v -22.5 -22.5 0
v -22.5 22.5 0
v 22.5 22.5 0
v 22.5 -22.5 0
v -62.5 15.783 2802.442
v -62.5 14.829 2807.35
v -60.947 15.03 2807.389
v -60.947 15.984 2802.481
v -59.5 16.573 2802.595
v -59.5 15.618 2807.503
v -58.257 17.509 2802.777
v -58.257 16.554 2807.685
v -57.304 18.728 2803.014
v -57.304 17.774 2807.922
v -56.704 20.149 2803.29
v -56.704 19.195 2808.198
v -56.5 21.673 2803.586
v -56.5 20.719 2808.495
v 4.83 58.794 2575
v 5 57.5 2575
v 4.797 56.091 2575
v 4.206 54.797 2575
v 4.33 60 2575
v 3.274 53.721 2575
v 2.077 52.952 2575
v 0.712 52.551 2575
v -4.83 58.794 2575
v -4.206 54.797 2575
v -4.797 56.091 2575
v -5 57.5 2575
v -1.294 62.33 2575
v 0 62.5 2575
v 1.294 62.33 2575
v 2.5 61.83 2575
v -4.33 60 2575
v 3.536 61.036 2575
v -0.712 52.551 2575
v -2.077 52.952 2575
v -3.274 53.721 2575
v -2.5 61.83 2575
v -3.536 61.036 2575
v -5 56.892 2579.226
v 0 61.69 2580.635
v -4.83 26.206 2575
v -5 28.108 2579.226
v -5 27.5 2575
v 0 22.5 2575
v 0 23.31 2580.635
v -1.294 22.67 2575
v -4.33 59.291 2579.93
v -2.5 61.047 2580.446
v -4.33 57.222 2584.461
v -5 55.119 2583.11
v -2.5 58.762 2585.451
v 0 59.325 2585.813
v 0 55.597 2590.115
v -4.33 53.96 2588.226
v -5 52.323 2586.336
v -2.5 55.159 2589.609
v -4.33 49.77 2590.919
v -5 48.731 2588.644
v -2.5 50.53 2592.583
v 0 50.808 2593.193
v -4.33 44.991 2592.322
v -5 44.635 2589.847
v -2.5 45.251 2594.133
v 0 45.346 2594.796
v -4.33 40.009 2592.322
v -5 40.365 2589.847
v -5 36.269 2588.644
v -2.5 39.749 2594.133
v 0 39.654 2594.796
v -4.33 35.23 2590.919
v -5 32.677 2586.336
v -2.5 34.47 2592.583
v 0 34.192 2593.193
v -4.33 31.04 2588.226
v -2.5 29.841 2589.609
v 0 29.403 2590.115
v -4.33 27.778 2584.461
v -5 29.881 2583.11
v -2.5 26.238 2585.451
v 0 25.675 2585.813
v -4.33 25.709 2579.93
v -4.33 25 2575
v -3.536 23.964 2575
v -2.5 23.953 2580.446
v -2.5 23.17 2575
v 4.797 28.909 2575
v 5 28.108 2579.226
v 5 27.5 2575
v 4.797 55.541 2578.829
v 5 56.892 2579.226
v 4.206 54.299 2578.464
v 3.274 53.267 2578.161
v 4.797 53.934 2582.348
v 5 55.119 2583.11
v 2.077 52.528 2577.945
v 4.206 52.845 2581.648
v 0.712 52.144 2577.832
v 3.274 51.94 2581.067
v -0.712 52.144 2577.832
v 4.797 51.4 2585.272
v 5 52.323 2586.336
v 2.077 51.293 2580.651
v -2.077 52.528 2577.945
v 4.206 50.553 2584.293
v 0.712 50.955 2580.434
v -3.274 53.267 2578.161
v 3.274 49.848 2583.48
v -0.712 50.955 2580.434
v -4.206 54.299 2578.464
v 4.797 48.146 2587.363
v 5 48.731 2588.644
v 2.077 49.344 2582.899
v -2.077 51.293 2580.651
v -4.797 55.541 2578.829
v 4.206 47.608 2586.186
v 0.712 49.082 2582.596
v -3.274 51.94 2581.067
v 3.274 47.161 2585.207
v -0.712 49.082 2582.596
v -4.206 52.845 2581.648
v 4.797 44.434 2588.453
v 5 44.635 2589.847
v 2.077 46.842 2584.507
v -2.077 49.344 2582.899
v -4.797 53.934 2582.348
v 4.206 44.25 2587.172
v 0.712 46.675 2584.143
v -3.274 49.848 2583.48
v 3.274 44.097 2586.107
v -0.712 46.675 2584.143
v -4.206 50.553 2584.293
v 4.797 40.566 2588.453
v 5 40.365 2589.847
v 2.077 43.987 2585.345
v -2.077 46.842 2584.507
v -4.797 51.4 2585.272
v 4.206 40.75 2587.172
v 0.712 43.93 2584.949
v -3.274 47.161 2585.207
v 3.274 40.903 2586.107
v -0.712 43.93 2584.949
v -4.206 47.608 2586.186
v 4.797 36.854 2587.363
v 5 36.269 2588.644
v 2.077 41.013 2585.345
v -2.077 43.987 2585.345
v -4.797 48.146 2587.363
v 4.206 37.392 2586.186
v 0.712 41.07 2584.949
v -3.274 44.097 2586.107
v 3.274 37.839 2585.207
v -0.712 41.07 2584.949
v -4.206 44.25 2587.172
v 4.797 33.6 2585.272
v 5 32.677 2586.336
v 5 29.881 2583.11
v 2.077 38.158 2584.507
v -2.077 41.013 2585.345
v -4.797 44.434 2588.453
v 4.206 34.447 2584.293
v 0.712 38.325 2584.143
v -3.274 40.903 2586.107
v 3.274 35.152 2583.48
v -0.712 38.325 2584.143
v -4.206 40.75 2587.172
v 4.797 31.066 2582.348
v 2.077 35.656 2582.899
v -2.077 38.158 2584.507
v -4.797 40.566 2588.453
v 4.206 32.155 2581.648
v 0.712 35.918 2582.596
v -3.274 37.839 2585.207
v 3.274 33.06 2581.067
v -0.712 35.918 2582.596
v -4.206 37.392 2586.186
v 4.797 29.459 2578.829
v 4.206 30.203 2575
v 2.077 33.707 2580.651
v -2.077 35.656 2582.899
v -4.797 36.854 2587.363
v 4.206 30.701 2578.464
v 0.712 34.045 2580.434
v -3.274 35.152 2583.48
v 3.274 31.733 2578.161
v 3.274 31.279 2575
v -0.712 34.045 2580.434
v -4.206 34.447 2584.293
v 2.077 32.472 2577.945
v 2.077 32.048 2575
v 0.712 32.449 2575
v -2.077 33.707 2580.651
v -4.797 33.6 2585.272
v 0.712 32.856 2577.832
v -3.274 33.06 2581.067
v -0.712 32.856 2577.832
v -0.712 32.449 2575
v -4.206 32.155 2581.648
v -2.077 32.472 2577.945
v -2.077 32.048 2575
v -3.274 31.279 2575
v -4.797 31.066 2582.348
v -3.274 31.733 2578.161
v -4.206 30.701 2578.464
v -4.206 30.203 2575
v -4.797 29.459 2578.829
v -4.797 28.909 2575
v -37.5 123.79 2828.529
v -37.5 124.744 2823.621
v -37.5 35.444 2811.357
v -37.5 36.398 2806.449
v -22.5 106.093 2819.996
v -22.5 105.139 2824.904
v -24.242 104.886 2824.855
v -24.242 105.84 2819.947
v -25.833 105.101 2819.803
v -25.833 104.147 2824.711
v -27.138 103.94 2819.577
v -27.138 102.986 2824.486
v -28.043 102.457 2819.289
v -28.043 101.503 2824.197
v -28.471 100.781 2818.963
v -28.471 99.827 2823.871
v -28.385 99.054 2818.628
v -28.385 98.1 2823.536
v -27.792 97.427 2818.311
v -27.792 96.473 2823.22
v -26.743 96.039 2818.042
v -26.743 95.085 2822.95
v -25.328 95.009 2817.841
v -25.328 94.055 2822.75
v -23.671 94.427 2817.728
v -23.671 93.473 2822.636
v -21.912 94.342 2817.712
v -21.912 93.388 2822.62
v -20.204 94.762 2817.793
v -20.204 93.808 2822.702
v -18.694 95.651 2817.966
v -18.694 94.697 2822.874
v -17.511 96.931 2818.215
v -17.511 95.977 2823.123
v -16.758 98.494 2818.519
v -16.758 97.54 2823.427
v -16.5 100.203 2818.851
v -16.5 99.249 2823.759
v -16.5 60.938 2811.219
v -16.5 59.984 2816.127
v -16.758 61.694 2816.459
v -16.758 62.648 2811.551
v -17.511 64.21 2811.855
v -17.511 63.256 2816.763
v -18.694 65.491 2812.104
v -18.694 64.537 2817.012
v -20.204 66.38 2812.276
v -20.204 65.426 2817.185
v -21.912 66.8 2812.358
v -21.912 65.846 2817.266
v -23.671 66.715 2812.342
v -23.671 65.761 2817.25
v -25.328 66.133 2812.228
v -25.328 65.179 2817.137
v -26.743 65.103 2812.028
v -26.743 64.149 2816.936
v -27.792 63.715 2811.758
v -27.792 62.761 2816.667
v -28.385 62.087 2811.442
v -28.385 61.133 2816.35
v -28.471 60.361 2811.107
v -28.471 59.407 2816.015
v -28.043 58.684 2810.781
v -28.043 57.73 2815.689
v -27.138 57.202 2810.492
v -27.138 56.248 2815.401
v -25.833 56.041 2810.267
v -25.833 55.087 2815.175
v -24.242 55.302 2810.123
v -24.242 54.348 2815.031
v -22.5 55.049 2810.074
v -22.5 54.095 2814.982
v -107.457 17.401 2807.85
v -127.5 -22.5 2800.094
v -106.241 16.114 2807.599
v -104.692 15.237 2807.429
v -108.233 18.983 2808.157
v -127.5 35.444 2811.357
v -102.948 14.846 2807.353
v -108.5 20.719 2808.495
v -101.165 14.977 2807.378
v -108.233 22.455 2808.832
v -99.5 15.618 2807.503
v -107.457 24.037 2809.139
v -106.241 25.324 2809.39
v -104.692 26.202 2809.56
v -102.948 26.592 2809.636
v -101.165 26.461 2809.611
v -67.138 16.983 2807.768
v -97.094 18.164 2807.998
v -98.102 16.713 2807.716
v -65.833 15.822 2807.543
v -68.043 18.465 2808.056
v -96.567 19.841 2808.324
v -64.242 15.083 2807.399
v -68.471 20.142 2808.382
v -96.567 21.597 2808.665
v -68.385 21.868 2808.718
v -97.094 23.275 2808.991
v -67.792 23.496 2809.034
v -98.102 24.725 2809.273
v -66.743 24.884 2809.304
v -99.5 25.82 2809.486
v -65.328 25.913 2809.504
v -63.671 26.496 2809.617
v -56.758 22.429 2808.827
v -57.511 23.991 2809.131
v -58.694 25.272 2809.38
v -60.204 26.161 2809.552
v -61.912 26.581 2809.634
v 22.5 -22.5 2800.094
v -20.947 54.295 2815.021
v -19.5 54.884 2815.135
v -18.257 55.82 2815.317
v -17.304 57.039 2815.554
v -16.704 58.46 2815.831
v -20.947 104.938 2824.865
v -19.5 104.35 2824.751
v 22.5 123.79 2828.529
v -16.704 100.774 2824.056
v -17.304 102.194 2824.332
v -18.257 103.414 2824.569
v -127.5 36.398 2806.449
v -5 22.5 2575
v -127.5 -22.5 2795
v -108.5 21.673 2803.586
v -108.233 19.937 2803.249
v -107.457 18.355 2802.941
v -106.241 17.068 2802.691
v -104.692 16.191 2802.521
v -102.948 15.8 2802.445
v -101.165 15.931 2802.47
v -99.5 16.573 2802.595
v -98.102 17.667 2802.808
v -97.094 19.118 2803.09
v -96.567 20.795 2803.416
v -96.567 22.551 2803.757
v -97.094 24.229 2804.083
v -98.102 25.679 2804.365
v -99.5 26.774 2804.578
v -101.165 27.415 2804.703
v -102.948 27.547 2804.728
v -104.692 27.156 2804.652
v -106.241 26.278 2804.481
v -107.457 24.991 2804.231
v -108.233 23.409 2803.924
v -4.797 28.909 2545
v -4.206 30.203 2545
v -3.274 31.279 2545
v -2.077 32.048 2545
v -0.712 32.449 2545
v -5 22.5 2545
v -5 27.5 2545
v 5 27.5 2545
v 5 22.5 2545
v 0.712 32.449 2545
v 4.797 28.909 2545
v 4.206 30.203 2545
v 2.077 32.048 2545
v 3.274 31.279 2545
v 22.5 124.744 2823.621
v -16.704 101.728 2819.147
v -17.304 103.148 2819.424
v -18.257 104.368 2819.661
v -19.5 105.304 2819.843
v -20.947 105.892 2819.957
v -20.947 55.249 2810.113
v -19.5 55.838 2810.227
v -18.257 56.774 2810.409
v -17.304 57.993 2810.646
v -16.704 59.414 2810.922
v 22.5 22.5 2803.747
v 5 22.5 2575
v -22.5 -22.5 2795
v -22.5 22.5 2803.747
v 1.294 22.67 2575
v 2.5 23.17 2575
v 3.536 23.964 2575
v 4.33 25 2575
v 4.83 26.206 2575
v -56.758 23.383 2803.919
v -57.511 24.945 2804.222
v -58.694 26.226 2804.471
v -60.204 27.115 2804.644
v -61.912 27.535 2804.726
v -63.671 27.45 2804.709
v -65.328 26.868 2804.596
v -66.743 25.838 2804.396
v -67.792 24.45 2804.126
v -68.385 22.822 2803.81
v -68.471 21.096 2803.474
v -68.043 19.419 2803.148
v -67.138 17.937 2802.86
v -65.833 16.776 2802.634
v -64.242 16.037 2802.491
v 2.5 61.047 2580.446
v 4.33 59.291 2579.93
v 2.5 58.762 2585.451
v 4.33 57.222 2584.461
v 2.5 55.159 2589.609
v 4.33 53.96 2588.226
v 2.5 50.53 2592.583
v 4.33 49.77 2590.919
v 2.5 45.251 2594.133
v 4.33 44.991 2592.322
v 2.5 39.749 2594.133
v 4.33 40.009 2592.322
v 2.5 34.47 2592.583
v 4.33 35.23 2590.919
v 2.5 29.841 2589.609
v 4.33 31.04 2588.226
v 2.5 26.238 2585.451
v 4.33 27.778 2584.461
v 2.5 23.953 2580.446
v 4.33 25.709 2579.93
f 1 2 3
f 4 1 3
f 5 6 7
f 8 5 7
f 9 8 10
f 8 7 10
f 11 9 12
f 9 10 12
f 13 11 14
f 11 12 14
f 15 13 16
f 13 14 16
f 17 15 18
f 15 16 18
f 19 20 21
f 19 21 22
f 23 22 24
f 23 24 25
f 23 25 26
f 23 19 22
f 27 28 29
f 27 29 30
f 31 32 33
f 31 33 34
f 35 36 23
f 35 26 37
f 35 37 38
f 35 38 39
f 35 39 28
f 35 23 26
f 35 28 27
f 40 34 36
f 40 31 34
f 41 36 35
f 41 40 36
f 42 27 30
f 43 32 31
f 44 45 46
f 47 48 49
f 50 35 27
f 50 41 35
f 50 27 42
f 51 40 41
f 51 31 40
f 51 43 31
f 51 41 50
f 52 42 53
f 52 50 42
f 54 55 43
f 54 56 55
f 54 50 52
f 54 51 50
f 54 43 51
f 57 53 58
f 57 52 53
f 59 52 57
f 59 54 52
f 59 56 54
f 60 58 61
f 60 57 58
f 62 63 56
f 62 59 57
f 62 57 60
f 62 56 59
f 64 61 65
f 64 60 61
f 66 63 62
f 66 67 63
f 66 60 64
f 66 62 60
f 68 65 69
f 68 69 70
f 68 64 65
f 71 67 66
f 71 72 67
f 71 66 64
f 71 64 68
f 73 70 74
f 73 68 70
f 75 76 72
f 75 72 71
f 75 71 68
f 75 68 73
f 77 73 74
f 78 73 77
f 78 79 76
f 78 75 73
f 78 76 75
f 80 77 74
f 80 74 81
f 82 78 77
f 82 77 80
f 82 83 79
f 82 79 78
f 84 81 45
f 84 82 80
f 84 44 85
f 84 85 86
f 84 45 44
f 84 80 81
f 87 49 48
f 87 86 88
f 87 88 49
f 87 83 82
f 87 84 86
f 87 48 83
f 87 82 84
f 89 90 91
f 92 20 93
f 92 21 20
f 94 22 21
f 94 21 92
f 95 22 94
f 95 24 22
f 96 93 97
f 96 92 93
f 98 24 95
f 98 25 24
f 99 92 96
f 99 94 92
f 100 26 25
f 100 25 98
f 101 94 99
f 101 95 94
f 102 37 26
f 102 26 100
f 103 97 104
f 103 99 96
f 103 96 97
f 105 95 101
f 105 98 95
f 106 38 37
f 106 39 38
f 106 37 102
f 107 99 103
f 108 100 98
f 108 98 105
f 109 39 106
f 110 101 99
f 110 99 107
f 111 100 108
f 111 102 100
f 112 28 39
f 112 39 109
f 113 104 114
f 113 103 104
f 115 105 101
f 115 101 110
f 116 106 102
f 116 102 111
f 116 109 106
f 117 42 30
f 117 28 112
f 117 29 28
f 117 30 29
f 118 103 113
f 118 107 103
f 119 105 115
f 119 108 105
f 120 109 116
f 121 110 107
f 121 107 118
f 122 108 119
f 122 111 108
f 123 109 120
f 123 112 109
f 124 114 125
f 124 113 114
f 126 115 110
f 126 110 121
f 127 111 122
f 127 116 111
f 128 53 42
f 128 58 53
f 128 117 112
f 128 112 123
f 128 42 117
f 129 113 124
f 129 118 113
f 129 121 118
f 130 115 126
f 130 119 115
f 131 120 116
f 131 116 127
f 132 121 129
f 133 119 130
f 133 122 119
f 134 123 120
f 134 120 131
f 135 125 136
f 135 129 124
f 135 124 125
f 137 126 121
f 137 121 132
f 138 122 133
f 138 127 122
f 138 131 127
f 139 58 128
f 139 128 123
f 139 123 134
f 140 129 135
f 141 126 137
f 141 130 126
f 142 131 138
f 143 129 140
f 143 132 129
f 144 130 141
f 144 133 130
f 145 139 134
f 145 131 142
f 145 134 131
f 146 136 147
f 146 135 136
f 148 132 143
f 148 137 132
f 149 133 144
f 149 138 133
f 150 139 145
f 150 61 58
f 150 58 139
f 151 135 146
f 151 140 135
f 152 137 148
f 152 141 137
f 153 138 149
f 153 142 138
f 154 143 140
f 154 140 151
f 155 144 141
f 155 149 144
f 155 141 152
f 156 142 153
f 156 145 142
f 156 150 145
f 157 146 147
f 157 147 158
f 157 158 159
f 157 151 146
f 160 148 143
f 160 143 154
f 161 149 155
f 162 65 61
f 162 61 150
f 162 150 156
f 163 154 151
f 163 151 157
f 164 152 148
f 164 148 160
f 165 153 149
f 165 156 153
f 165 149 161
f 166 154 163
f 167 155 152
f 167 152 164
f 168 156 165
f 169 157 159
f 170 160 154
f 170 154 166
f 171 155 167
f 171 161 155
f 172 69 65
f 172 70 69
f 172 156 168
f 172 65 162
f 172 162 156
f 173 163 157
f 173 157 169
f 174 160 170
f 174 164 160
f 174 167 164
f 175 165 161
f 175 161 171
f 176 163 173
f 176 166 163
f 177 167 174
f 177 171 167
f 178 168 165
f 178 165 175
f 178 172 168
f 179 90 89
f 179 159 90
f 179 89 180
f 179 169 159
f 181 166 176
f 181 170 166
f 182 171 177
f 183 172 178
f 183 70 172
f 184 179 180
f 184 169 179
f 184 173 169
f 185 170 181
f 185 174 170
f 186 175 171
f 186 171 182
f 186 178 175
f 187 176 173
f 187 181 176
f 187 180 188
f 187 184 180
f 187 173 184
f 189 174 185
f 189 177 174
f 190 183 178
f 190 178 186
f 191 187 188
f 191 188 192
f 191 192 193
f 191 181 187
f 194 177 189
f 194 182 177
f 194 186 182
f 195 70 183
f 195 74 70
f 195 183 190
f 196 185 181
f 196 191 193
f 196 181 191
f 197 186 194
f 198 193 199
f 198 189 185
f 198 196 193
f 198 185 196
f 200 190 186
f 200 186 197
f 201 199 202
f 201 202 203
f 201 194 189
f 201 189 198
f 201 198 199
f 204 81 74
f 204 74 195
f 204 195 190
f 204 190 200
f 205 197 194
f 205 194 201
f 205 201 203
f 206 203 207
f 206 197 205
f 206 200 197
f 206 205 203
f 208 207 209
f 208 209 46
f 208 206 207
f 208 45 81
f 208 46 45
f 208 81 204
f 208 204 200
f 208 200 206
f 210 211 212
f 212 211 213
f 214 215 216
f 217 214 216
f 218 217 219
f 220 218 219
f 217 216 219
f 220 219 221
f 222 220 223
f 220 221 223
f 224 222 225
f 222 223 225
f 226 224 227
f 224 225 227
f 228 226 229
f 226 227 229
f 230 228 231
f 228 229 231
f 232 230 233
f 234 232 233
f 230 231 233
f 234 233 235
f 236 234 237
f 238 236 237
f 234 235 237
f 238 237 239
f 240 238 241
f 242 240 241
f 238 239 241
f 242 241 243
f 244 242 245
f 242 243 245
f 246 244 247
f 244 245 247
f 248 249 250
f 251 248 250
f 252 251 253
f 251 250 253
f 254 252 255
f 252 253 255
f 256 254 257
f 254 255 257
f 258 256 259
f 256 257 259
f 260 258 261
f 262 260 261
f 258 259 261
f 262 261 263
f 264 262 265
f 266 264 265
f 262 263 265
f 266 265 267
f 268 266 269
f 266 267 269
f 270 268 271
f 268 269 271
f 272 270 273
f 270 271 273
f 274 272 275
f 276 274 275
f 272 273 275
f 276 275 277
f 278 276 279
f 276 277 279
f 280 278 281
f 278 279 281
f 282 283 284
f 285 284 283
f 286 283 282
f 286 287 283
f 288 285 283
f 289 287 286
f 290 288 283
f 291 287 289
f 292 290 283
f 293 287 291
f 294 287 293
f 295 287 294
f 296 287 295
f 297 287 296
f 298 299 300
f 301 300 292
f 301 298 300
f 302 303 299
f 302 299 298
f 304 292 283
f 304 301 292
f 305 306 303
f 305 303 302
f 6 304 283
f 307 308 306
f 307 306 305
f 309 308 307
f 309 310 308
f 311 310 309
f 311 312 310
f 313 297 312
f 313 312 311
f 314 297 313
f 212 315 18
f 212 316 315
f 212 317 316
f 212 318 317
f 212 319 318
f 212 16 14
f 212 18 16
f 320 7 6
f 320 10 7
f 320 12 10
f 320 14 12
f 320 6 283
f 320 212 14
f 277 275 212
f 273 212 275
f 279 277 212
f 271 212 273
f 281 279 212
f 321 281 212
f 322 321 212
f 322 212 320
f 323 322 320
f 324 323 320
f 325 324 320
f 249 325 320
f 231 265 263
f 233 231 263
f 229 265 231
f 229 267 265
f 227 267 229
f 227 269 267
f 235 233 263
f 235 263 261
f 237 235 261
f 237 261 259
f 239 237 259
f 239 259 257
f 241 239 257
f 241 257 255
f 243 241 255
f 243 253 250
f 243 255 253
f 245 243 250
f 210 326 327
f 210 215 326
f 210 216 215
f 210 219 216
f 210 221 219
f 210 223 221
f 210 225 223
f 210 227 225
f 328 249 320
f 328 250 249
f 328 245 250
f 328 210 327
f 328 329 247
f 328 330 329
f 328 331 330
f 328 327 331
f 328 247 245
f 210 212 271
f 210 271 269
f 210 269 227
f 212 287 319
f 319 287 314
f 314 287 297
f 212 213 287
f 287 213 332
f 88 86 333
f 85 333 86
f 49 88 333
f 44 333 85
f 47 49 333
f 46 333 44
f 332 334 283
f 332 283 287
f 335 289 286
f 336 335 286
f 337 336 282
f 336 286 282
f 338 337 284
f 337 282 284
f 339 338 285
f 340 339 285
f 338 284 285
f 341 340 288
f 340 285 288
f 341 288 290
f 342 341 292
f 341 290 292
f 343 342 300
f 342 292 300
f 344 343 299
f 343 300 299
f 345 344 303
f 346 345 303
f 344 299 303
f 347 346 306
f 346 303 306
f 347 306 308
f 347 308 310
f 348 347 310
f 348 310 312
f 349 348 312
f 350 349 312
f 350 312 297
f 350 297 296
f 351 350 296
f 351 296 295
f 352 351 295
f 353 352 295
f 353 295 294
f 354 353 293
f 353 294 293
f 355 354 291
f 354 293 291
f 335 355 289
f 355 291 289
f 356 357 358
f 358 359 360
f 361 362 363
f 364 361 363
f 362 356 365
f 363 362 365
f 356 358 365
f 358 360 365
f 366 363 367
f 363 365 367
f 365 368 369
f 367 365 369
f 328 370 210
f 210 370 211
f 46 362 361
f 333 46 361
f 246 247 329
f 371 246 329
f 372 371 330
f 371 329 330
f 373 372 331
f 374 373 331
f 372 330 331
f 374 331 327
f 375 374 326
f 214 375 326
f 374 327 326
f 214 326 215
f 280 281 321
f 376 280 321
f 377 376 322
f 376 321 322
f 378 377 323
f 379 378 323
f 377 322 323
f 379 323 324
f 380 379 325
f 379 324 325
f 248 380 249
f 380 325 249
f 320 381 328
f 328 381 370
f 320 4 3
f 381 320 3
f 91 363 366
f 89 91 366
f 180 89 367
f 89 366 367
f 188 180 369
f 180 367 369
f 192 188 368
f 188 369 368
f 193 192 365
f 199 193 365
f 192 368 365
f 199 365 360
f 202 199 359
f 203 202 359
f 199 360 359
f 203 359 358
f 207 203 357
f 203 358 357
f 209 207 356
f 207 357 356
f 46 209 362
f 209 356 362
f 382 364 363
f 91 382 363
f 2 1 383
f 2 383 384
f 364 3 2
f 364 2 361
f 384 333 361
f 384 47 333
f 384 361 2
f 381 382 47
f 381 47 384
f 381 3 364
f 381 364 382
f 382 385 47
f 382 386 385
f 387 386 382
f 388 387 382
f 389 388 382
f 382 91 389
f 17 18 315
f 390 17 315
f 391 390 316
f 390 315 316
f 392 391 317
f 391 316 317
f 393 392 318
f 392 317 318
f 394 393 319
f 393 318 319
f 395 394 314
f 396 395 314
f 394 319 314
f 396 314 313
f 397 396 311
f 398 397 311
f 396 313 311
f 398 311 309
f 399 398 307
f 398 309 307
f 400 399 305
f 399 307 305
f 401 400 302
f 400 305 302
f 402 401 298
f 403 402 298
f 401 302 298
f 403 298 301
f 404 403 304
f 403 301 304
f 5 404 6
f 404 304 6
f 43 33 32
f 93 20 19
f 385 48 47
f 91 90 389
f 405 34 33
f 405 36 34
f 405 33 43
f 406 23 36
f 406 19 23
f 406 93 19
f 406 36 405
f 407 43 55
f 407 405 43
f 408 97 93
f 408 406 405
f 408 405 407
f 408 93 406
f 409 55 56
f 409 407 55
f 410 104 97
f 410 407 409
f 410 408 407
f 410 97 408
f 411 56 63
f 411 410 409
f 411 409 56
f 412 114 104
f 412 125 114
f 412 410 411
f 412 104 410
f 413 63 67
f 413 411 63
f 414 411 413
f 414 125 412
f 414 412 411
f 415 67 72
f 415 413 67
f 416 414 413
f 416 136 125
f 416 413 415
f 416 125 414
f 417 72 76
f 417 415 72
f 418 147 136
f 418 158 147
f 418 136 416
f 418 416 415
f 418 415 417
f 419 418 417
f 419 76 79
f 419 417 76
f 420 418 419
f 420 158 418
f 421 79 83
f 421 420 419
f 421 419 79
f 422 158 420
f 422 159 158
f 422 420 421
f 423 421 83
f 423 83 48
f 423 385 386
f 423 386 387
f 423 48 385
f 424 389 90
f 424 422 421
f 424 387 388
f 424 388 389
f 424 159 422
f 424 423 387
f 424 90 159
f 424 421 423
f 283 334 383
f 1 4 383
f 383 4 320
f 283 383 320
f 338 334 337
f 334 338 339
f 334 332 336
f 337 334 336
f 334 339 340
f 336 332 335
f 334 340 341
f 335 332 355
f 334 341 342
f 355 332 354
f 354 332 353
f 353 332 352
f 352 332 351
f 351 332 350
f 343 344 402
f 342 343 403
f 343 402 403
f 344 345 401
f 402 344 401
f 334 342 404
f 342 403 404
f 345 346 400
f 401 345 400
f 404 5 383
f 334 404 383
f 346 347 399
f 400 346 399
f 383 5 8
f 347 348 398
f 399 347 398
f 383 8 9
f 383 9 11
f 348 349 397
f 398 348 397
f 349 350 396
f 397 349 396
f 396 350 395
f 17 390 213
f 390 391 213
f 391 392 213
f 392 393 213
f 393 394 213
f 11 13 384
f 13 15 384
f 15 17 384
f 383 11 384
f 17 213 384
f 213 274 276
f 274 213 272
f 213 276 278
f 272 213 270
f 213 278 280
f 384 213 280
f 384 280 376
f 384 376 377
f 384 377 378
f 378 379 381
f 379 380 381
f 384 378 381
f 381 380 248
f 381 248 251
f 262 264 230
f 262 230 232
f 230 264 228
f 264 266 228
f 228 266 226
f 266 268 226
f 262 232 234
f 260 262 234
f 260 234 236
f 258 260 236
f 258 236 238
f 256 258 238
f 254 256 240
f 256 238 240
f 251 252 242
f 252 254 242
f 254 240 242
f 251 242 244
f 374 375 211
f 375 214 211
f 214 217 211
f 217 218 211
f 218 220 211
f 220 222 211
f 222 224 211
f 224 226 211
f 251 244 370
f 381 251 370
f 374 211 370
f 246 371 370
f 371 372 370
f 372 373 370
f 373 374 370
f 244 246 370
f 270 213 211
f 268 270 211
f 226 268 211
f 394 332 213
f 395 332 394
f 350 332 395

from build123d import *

# Parameters (mm, degrees)
F0_W          = 45
F0_H          = 45
F1_DEPTH      = 2795
F3_W          = 45
F3_H          = 60
F3_W_2        = 90
F3_W_3        = 15
F4_DEPTH      = 5
F6_DEPTH      = 45
F8_W          = 2.7798460424
F8_H          = 5.7082939148
F9_DEPTH      = 156.8
F9_DEPTH_BACK = 105
F14_DEPTH     = 5
F15_DEPTH     = 30


with BuildPart() as f1:
    # F0 (on Top) → F1 (new body)
    with BuildSketch(Plane.XY):
        Rectangle(F0_W, F0_H)
    extrude(amount=F1_DEPTH)


with BuildPart() as f4:
    # F3 (on face) → F4 (new body)
    with BuildSketch(Plane(origin=(0, -524.3318959349, 2697.453760933), x_dir=(1, 0, 0), z_dir=(0, -0.1908089954, 0.9816271834))):
        with Locations((-15, 541.2245304499)):
            Rectangle(F3_W, F3_H)
        with Locations((-82.5, 541.2245304499)):
            Rectangle(F3_W_2, F3_H)
        with Locations((15, 541.2245304499)):
            Rectangle(F3_W_3, F3_H)
        Polygon((-37.5, 661.2245304499), (-37.5, 571.2245304499), (7.5, 571.2245304499), (22.5, 571.2245304499), (22.5, 661.2245304499), align=None)
    extrude(amount=F4_DEPTH)


with BuildPart() as f6:
    # F5 (on face) → F6 (new body)
    with BuildSketch(Plane.YZ.offset(22.5)):
        Polygon((-22.5, 2795), (22.5, 2795), (22.5, 2803.7471139112), align=None)
    extrude(amount=-F6_DEPTH)


with BuildPart() as f1_1:
    add(f1.part)

    # F7: union F6, F4
    add(f6.part)
    add(f4.part)

    # F8 (on face) → F9 (cut, two sides)
    with BuildSketch(Plane(origin=(-22.5, 0, 0), x_dir=(0, -1, 0), z_dir=(-1, 0, 0))) as f9_sk:
        with Locations((23.8899230212, 2797.8541469574)):
            Rectangle(F8_W, F8_H)
    extrude(amount=-F9_DEPTH, mode=Mode.SUBTRACT)
    extrude(f9_sk.sketch, amount=F9_DEPTH_BACK, mode=Mode.SUBTRACT)

    # F13 (on face) → F14 (cut, through all)
    with BuildSketch(Plane(origin=(0, -525.2859409117, 2702.3618968503), x_dir=(1, 0, 0), z_dir=(0, -0.1908089954, 0.9816271834))):
        with BuildLine():
            ThreePointArc((-56.5, 556.2245304499), (-66.7426406871, 560.467171137), (-62.5, 550.2245304499))
            ThreePointArc((-62.5, 550.2245304499), (-58.2573593129, 551.9818897628), (-56.5, 556.2245304499))
        make_face()
        with BuildLine():
            ThreePointArc((-96.5, 556.2245304499), (-102.5, 562.2245304499), (-108.5, 556.2245304499))
            ThreePointArc((-108.5, 556.2245304499), (-102.5, 550.2245304499), (-96.5, 556.2245304499))
        make_face()
        with BuildLine():
            ThreePointArc((-16.5, 596.2245304499), (-26.7426406871, 600.467171137), (-22.5, 590.2245304499))
            ThreePointArc((-22.5, 590.2245304499), (-18.2573593129, 591.9818897628), (-16.5, 596.2245304499))
        make_face()
        with BuildLine():
            ThreePointArc((-16.5, 636.2245304499), (-18.2573593129, 640.467171137), (-22.5, 642.2245304499))
            ThreePointArc((-22.5, 642.2245304499), (-26.7426406871, 631.9818897628), (-16.5, 636.2245304499))
        make_face()
    extrude(amount=-F14_DEPTH, mode=Mode.SUBTRACT)

    # F12 (on offset) → F15 (join)
    with BuildSketch(Plane.XY.offset(2545)):
        with BuildLine():
            Line((0, 27.5), (5, 27.5))
            ThreePointArc((5, 27.5), (0, 32.5), (-5, 27.5))
            Line((-5, 27.5), (0, 27.5))
        make_face()
        with BuildLine():
            Line((5, 22.5), (5, 27.5))
            ThreePointArc((5, 27.5), (3.5355339059, 23.9644660941), (0, 22.5))
            Line((0, 22.5), (5, 22.5))
        make_face()
        with BuildLine():
            ThreePointArc((0, 22.5), (3.5355339059, 23.9644660941), (5, 27.5))
            Line((5, 27.5), (0, 27.5))
            Line((0, 27.5), (0, 22.5))
        make_face()
        with BuildLine():
            Line((0, 27.5), (-5, 27.5))
            ThreePointArc((-5, 27.5), (-3.5355339059, 23.9644660941), (0, 22.5))
            Line((0, 22.5), (0, 27.5))
        make_face()
        with BuildLine():
            ThreePointArc((0, 22.5), (-3.5355339059, 23.9644660941), (-5, 27.5))
            Line((-5, 27.5), (-5, 22.5))
            Line((-5, 22.5), (0, 22.5))
        make_face()
    extrude(amount=F15_DEPTH)

    # F17: sweep along a path in F11
    with BuildLine(Plane.YZ) as f17_path:
        ThreePointArc((57.5, 2575), (42.5, 2590), (27.5, 2575))
    # F16 (on face) → F17 (sweep)
    with BuildSketch(Plane.XY.offset(2575)):
        with BuildLine():
            ThreePointArc((0, 22.5), (3.5355339059, 23.9644660941), (5, 27.5))
            ThreePointArc((5, 27.5), (0, 32.5), (-5, 27.5))
            ThreePointArc((-5, 27.5), (-3.5355339059, 23.9644660941), (0, 22.5))
        make_face()
    sweep(path=f17_path.line)


solid = f1_1.part
